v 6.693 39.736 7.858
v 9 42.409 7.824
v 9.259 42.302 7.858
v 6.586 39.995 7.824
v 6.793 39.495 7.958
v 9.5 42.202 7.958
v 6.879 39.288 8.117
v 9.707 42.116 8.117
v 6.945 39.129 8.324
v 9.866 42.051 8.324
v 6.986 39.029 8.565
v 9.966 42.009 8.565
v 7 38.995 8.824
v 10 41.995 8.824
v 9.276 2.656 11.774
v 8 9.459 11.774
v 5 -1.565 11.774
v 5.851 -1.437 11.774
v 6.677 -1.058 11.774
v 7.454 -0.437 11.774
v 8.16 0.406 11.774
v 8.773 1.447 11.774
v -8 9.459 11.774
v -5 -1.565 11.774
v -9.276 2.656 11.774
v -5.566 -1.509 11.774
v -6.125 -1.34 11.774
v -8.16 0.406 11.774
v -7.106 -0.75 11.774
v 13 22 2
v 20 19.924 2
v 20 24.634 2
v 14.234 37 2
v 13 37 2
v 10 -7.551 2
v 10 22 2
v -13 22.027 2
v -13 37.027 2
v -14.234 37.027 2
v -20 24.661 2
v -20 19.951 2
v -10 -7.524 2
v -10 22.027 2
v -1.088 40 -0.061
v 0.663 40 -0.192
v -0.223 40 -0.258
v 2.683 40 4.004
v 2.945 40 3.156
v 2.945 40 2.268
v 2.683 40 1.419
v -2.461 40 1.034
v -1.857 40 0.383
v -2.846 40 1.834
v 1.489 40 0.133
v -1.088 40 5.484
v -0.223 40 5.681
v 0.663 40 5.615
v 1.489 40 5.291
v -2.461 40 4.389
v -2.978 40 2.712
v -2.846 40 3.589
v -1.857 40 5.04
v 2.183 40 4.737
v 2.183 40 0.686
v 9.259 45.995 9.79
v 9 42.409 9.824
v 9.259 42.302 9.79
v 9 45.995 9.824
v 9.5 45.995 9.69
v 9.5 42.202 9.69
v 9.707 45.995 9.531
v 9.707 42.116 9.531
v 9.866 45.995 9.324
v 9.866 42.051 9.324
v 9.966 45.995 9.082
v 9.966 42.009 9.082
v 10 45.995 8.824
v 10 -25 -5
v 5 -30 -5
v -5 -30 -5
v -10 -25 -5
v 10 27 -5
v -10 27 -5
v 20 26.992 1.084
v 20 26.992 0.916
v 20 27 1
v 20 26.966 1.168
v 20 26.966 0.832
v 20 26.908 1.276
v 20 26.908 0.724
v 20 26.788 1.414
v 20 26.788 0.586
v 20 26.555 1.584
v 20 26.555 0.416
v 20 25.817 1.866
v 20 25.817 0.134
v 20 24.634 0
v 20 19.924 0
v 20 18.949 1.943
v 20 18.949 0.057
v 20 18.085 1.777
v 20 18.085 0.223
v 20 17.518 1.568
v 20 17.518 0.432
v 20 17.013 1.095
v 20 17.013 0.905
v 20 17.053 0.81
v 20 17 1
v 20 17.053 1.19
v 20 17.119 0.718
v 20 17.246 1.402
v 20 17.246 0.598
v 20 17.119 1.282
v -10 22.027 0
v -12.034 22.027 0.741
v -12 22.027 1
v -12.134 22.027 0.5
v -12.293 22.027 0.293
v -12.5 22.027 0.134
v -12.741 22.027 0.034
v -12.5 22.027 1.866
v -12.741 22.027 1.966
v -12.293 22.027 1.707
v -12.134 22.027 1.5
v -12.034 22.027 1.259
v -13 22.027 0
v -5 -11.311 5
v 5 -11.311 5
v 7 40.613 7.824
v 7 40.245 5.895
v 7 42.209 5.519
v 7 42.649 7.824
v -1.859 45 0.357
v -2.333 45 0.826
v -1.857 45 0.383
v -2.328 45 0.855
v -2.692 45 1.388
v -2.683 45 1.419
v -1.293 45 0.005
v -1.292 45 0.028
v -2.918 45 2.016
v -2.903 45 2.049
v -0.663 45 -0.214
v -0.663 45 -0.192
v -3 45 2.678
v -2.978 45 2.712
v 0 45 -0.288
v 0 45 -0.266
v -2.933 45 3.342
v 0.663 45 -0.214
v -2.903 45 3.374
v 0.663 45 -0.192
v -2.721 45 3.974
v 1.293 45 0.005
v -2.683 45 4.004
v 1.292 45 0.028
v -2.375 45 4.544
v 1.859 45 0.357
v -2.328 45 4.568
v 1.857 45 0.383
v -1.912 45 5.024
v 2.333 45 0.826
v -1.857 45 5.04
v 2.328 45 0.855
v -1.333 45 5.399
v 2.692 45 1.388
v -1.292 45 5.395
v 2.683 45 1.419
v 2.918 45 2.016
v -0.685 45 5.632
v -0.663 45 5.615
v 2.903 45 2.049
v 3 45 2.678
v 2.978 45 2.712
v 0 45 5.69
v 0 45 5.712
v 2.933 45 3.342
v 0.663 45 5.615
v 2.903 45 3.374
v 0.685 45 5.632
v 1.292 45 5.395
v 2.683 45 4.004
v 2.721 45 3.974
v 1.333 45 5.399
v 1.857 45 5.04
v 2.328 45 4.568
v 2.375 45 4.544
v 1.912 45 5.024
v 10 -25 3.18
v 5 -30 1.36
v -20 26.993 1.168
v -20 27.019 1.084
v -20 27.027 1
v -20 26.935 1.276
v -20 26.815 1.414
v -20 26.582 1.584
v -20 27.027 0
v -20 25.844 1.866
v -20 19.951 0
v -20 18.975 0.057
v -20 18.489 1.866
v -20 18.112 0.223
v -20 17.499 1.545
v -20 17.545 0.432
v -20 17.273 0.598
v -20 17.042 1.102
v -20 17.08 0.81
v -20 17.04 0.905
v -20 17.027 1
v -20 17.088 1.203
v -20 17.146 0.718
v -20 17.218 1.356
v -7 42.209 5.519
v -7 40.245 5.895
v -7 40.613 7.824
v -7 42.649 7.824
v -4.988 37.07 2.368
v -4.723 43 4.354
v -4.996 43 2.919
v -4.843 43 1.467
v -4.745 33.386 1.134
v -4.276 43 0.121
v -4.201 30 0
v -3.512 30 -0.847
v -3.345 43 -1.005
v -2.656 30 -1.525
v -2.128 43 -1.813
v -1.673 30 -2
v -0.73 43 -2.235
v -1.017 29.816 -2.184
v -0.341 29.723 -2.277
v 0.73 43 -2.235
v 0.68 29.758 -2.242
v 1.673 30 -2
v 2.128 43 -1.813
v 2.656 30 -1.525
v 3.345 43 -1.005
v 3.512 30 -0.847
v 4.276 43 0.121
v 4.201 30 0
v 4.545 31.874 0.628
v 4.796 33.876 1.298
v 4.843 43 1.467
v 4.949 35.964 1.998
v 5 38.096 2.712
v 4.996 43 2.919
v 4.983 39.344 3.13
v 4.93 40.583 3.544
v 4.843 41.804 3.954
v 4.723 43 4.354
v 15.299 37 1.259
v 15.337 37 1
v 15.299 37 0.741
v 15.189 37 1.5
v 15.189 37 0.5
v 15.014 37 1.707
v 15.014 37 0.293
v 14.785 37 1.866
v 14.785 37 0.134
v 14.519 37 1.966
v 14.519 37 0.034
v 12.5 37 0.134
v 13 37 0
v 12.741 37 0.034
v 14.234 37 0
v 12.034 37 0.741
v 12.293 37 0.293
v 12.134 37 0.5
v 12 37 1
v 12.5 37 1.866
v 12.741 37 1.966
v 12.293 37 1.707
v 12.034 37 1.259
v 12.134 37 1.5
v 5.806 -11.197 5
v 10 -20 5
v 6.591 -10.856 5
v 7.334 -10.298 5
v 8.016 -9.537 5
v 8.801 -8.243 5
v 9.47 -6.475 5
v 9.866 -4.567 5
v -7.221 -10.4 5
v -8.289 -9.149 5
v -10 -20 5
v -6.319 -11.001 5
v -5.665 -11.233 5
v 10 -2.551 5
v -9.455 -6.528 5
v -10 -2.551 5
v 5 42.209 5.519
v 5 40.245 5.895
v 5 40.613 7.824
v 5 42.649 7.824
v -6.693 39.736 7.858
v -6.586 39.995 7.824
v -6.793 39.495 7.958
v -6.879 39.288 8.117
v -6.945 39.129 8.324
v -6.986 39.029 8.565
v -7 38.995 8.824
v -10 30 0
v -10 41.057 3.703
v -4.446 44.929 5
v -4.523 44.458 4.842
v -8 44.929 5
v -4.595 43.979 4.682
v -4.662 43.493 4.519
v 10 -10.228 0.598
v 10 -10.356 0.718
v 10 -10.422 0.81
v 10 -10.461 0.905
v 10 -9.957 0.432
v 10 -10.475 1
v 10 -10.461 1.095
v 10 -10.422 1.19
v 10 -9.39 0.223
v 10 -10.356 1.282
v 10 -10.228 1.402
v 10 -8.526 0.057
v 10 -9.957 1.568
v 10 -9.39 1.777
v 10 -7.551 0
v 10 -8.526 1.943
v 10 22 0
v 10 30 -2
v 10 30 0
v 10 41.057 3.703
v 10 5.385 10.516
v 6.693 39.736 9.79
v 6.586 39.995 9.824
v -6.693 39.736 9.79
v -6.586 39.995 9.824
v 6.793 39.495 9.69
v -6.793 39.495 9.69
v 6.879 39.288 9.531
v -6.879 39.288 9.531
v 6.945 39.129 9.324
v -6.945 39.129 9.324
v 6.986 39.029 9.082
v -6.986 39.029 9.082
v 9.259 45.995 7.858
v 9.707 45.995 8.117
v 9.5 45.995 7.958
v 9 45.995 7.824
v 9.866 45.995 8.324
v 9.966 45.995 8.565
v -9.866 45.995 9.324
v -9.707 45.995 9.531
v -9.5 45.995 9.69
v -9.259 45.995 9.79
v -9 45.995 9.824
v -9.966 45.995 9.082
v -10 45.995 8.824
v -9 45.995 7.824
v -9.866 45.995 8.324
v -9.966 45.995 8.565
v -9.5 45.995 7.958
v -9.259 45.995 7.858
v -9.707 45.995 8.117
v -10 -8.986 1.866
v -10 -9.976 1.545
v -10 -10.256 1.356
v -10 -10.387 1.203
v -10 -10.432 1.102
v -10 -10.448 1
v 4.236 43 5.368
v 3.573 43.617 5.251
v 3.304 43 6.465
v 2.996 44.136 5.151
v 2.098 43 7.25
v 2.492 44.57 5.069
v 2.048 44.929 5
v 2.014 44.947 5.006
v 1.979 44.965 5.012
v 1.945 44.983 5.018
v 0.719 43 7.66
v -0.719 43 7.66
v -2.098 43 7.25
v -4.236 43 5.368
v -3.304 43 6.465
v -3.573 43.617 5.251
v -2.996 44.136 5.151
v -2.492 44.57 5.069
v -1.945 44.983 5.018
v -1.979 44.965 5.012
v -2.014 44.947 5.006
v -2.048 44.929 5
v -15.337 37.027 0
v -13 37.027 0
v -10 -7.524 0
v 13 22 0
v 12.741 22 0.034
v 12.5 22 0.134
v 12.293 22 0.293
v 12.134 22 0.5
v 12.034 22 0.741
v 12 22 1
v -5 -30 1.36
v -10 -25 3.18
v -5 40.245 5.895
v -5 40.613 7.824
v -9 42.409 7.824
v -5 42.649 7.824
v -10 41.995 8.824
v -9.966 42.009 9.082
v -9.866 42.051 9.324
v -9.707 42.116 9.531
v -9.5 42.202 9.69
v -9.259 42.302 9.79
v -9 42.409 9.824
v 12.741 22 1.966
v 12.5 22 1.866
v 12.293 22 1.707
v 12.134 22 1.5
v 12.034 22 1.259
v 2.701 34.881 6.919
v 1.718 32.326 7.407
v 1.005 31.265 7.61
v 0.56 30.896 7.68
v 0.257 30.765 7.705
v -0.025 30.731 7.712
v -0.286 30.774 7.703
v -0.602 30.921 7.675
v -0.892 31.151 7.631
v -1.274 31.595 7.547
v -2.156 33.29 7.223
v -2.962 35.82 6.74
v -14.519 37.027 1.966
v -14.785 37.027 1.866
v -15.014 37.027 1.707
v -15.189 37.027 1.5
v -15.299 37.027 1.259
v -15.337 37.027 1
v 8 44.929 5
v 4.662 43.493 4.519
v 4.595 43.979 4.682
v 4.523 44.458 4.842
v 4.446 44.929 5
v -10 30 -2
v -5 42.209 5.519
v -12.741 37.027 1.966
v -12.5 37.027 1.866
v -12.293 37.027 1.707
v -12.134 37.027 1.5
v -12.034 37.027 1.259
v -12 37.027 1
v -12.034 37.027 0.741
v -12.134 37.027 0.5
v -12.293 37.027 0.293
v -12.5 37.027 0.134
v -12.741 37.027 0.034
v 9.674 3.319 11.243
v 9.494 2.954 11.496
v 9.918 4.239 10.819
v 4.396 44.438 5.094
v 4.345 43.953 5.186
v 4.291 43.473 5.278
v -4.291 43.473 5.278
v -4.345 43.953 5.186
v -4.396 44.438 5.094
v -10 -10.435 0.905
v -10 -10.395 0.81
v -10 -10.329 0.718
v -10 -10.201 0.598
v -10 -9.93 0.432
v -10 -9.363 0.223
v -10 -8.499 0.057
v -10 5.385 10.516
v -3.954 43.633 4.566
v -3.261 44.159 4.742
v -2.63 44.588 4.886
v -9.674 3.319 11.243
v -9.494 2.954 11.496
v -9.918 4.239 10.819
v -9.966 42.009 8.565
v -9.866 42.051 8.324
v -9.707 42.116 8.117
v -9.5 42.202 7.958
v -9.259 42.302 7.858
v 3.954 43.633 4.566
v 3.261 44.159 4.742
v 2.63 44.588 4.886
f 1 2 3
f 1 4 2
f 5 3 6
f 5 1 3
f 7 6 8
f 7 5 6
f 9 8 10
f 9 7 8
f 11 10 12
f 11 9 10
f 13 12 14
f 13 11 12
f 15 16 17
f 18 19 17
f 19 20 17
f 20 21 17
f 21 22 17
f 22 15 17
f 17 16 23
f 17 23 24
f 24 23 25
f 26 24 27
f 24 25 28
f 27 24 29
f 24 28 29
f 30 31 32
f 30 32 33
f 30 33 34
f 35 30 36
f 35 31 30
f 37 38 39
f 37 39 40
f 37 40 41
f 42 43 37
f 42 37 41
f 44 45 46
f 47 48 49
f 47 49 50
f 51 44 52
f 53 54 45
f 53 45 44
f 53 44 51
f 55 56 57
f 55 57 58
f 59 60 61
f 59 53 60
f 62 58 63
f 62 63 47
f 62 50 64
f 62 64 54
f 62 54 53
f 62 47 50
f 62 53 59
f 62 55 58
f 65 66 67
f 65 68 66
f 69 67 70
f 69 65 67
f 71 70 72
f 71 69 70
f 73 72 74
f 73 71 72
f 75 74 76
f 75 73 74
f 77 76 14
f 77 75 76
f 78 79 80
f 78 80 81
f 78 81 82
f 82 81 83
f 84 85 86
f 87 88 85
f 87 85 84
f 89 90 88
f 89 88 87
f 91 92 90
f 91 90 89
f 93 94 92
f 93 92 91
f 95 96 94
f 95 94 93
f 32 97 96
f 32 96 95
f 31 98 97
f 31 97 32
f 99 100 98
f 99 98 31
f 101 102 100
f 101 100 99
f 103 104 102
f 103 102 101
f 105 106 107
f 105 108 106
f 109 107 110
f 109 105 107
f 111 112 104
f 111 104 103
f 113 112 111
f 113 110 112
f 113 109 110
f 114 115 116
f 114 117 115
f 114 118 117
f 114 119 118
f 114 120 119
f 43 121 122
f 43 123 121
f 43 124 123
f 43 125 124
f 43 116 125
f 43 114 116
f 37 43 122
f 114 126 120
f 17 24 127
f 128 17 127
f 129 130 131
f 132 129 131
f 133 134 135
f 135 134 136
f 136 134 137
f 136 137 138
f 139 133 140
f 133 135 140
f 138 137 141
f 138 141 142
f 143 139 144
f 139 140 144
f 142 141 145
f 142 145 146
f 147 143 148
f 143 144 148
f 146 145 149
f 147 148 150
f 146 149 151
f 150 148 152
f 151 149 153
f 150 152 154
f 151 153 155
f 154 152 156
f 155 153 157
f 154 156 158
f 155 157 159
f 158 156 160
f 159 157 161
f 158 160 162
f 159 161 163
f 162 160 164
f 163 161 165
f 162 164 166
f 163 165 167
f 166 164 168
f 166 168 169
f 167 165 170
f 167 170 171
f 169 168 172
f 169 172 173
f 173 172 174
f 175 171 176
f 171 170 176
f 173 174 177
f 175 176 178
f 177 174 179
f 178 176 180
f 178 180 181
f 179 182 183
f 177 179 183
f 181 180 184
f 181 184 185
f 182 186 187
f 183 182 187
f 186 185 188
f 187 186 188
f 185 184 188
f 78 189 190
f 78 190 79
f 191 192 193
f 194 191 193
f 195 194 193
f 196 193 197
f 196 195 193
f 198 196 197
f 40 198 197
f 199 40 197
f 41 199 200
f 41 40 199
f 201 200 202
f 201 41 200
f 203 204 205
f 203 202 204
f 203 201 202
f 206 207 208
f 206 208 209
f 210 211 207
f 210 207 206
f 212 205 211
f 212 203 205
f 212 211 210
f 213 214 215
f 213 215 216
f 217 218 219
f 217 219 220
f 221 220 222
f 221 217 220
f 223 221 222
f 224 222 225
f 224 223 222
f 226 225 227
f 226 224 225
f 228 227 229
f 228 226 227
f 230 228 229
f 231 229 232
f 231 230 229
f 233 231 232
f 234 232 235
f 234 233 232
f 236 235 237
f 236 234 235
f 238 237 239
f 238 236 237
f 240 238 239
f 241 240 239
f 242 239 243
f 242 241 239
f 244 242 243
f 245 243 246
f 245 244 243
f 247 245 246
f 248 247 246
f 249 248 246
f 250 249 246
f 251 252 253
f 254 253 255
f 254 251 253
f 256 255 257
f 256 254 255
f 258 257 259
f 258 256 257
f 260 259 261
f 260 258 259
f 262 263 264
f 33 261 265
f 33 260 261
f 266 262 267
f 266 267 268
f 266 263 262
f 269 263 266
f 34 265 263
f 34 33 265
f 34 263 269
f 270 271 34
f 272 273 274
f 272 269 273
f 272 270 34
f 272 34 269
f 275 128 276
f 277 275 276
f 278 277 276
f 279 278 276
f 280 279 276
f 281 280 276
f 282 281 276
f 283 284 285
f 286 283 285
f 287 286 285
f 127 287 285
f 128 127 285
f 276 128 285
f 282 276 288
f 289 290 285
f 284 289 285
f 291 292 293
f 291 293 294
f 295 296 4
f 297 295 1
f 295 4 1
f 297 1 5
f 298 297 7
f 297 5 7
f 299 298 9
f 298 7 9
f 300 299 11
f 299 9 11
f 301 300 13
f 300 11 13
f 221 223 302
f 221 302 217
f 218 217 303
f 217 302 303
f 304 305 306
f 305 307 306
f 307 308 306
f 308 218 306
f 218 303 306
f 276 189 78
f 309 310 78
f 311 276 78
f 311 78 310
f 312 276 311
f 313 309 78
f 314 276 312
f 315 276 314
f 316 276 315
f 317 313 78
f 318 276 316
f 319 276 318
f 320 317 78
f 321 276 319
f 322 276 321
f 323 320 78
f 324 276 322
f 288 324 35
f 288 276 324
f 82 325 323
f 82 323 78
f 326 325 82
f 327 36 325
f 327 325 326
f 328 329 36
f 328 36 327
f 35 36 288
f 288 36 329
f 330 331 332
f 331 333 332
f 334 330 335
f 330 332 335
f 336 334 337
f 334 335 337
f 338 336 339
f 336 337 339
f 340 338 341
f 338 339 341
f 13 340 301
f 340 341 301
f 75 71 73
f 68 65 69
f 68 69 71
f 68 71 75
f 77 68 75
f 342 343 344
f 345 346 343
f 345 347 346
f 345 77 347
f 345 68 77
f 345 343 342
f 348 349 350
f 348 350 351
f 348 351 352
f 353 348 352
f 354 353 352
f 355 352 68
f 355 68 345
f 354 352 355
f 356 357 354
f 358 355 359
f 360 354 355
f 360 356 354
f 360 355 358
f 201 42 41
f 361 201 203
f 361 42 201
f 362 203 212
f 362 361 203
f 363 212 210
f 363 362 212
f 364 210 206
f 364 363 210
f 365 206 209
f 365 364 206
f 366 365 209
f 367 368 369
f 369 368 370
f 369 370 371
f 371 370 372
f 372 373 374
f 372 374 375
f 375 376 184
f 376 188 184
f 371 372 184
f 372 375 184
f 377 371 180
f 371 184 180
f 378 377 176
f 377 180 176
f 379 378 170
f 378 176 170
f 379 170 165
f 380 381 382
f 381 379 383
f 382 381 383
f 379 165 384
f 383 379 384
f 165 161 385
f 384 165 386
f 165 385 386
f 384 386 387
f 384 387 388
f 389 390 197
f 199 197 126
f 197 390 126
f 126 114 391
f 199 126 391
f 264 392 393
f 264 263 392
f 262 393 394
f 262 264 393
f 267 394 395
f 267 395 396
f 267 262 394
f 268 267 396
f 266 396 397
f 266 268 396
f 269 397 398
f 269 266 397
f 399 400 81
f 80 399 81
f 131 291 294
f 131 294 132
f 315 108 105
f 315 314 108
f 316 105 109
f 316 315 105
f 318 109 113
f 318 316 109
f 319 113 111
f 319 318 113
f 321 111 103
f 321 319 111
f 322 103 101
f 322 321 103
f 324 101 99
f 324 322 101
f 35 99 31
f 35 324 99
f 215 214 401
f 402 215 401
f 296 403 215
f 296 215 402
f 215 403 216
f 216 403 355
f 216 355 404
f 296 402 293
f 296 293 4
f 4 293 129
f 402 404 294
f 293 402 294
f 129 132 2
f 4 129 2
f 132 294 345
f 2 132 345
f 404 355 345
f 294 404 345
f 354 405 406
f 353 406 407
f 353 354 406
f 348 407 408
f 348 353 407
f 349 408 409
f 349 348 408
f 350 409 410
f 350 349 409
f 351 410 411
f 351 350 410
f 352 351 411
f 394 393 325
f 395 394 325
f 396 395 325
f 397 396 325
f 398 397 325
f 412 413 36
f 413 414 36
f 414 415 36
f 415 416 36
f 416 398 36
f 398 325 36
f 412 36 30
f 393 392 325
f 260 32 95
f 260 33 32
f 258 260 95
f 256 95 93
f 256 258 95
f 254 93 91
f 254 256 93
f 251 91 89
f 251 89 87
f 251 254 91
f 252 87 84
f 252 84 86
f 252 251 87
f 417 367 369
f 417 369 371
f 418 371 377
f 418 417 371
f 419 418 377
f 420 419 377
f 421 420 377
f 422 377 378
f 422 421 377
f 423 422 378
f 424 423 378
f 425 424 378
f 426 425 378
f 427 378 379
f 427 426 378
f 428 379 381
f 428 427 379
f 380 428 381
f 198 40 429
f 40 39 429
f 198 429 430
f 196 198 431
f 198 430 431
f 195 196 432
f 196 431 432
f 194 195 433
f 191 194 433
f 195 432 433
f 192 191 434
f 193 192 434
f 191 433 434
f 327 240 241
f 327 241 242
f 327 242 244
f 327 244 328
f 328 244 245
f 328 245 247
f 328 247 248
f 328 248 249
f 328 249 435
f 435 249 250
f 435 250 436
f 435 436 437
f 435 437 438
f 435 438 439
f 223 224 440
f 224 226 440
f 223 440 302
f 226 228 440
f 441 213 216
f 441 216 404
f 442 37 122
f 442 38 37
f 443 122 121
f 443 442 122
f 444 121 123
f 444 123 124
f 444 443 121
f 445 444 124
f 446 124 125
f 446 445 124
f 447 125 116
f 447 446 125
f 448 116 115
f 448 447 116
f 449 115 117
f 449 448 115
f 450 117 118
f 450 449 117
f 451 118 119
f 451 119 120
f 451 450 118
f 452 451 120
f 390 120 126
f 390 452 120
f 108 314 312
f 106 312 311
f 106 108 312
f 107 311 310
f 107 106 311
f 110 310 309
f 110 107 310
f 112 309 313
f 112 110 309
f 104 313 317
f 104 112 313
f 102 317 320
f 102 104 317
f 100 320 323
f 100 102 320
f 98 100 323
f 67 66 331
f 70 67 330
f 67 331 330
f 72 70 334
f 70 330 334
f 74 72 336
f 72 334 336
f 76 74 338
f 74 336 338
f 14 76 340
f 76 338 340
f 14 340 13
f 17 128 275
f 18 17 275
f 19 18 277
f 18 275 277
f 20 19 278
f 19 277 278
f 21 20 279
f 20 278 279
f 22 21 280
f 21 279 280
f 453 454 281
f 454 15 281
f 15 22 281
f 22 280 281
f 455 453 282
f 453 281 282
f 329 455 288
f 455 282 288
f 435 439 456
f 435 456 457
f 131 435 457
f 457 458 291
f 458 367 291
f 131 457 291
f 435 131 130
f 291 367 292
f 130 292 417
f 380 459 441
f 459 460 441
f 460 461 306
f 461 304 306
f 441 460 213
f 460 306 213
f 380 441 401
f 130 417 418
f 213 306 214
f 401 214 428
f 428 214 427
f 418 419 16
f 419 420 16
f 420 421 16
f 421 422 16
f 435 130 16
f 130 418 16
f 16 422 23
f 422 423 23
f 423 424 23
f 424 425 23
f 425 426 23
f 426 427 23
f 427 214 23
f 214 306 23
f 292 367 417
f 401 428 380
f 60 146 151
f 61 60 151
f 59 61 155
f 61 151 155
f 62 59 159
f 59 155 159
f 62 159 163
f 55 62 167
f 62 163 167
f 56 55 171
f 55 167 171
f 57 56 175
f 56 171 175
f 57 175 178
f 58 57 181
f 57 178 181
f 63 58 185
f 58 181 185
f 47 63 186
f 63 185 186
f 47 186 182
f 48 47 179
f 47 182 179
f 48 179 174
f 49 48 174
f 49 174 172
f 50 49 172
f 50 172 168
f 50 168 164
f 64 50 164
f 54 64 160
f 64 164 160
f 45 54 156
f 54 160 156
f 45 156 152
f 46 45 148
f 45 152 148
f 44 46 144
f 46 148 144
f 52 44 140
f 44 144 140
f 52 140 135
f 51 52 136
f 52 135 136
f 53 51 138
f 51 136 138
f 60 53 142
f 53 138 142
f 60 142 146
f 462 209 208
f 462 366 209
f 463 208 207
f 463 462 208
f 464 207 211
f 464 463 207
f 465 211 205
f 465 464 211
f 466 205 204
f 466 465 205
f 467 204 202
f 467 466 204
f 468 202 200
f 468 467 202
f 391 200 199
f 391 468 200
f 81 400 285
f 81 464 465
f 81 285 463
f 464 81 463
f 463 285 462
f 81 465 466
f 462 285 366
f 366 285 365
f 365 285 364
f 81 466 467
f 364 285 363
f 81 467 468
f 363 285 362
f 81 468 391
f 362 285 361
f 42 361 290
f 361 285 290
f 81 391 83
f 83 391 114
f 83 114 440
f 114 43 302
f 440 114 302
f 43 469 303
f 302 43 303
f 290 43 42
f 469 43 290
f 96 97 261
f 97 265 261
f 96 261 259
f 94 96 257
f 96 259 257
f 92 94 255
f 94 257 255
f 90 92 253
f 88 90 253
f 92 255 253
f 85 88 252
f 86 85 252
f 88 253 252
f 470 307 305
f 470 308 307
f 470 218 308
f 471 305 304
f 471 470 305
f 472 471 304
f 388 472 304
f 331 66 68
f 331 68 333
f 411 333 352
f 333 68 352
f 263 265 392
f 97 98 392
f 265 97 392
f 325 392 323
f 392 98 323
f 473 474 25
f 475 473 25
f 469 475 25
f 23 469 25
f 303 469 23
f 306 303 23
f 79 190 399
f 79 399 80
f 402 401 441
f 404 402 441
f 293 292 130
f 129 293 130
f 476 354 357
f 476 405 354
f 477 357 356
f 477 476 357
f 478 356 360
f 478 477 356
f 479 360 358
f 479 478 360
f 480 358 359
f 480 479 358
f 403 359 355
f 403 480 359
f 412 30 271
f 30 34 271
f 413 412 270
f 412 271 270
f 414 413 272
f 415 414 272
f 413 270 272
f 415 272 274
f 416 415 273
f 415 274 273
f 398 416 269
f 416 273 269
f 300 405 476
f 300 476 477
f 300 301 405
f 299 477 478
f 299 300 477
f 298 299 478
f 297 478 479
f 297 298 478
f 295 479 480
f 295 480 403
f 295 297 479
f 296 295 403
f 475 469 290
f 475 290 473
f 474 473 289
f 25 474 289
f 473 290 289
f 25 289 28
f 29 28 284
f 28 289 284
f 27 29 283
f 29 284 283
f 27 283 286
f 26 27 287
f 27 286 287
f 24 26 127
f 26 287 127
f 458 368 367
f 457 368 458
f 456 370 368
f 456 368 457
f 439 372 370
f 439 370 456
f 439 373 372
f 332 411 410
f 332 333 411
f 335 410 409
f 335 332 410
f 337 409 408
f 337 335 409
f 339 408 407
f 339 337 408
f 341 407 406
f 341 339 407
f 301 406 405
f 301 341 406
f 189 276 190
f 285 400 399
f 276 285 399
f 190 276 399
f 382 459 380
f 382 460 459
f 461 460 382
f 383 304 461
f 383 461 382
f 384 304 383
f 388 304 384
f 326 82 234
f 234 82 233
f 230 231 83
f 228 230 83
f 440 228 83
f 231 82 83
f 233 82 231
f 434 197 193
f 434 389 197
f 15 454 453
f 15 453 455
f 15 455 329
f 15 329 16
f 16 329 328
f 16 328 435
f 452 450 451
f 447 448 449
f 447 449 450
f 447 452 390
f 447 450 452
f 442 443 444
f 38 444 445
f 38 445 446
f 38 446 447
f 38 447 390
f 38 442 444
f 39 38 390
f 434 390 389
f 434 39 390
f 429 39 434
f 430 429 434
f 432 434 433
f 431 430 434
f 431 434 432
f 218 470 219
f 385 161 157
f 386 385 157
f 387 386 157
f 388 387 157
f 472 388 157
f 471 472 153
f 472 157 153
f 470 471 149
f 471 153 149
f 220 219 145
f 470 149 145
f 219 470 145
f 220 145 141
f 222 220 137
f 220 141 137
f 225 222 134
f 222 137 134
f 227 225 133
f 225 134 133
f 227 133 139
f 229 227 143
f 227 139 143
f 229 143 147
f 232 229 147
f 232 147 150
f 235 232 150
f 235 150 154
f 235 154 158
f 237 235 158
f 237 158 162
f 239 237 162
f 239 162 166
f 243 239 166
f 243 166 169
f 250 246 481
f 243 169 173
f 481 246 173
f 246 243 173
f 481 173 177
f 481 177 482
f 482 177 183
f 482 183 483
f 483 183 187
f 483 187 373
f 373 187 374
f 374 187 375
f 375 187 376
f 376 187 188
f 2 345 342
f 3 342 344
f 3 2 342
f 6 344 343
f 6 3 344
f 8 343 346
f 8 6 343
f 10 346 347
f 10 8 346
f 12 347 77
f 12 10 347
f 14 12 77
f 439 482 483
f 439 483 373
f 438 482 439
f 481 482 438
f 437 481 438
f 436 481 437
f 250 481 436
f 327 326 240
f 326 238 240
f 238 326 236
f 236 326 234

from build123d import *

# Parameters (mm, degrees)
F1_DEPTH     = 10
F2_DEPTH     = 10
F3_R         = 5
F4_T1_DEPTH  = 71.883894651
F5_T1_DEPTH  = 56.6843134125
F6_SIZE      = 3
F7_SIZE      = 5
F10_DEPTH    = 10
F9_W         = 35
F9_H         = 2
F11_DEPTH    = 10
F12_T4_DEPTH = 157.651683953
F13_T4_DEPTH = 157.651683953
F14_W        = 8
F14_H        = 2
F15_W        = 8
F15_H        = 2
F16_DEPTH    = 15
F17_SIZE2    = 4.6630765815
F17_SIZE     = 10
F18_SIZE2    = 4.6630765815
F18_SIZE     = 10
F19_R        = 0.99999
F20_R        = 5
F21_DEPTH    = 45
F22_R        = 2.9781353661
F23_DEPTH    = 5
F25_W        = 2
F25_H        = 2
F26_DEPTH    = 4
F28_DEPTH    = 15
F29_DEPTH    = 5
F30_W        = 5
F30_H        = 2
F31_DEPTH    = 2
F32_SIZE     = 3
F33_R        = 0.99999


# Not quite as in the source:
# - a fillet or chamfer that OpenCascade refuses, or shapes differently, is made with other operations: its cross-section is extruded or revolved along the edge and cut away or added
# - a fillet or chamfer is up to 0.001 mm smaller than in the source, because OpenCascade refuses the exact size


with BuildPart() as f1:
    # F0 (on Right) → F1 (new body)
    with BuildSketch(Plane.YZ):
        Polygon((30, 5), (30, 0), (44.9290536344, 5), (9.4593074173, 11.7742568254), (-1.5650746645, 11.7742568254), (-11.31126564, 5), align=None)
        Polygon((30, 0), (0, 0), (-30, 0), (-30, -5), (30, -5), align=None)
        Polygon((-30, 0), (0, 0), (30, 0), (30, 5), (-11.31126564, 5), (-30, 5), align=None)
    extrude(amount=-F1_DEPTH)

    # F2 (add): a face of the model
    f2_faces = [f1.faces().sort_by_distance(p)[0] for p in [
        (0, 4.6213303299, 2.1526362718),
    ]]
    extrude(f2_faces, amount=F2_DEPTH)

    # F3
    f3_edges = [f1.edges().sort_by_distance(p)[0] for p in [
        (-10, -6.43817, 8.387128),
        (10, -6.43817, 8.387128),
    ]]
    fillet(f3_edges, radius=F3_R)

    # F4: chamfer of 10 x 3.6397023427 on 1 edges, made by hand

    # F4_s2 → F4_t1 (cut)
    with BuildSketch(Plane.YZ.offset(-35.9419473255)):
        Polygon((-20, 5), (-30, 1.3602976573), (-30, 5), align=None)
    extrude(amount=F4_T1_DEPTH, mode=Mode.SUBTRACT)

    # F5: chamfer of 2 on 2 edges, made by hand

    # F5_s2 → F5_t1 (cut)
    with BuildSketch(Plane(origin=(0, 47.4786197454, -9.0677943367), x_dir=(1, 0, 0), z_dir=(0, -0.9822462418, 0.1875961634))):
        Polygon((-10, 11.3397492965), (-8, 13.3397492965), (-10, 13.3397492965), align=None)
        Polygon((10, 11.3397492965), (8, 13.3397492965), (10, 13.3397492965), align=None)
    extrude(amount=F5_T1_DEPTH, mode=Mode.SUBTRACT)

    # F6
    f6_edges = [f1.edges().sort_by_distance(p)[0] for p in [
        (0, 30, -5),
    ]]
    chamfer(f6_edges, length=F6_SIZE)

    # F7
    f7_edges = [f1.edges().sort_by_distance(p)[0] for p in [
        (-10, -30, -1.819851),
        (10, -30, -1.819851),
    ]]
    chamfer(f7_edges, length=F7_SIZE)

    # F8 (on face) → F10 (join)
    with BuildSketch(Plane.YZ.offset(10)):
        Polygon((-13, 0), (0, 0), (22, 0), (22, 2), (-13, 2), align=None)
    extrude(amount=F10_DEPTH)

    # F9 (on face) → F11 (join)
    with BuildSketch(Plane(origin=(-10, 0, 0), x_dir=(0, -1, 0), z_dir=(-1, 0, 0))):
        with Locations((-4.5269672573, 1)):
            Rectangle(F9_W, F9_H)
    extrude(amount=F11_DEPTH)

    # F12: chamfer of 30 x 10.919107028 on 1 edges, made by hand


with BuildPart() as f12_tool2:
    # F12_s3 → F12_t4 (new body)
    with BuildSketch(Plane.XY.offset(-77.8258419765)):
        Polygon((-9.080892972, -12.9730327427), (-20, 17.0269672573), (-20, -12.9730327427), align=None)
    extrude(amount=F12_T4_DEPTH)

    split(bisect_by=Plane.YZ.offset(-10), keep=Keep.BOTTOM)


with BuildPart() as f1_1:
    add(f1.part)

    # F12_t1: cut F12_tool2
    add(f12_tool2.part, mode=Mode.SUBTRACT)

    # F13: chamfer of 30 x 10.919107028 on 1 edges, made by hand


with BuildPart() as f13_tool2:
    # F13_s3 → F13_t4 (new body)
    with BuildSketch(Plane.XY.offset(79.8258419765)):
        Polygon((9.080892972, -13), (20, 17), (20, -13), align=None)
    extrude(amount=-F13_T4_DEPTH)

    split(bisect_by=Plane.YZ.offset(10), keep=Keep.TOP)


with BuildPart() as f1_2:
    add(f1_1.part)

    # F13_t1: cut F13_tool2
    add(f13_tool2.part, mode=Mode.SUBTRACT)

    # F14 (on face) + F15 (on face) → F16 (join)
    with BuildSketch(Plane(origin=(0, 22, 0), x_dir=(-1, 0, 0), z_dir=(0, 1, 0))):
        with Locations((-16, 1)):
            Rectangle(F14_W, F14_H)
    with BuildSketch(Plane(origin=(0, 22.0269672573, 0), x_dir=(-1, 0, 0), z_dir=(0, 1, 0))):
        with Locations((16, 1)):
            Rectangle(F15_W, F15_H)
    extrude(amount=F16_DEPTH)

    # F17
    f17_edges = [f1_2.edges().sort_by_distance(p)[0] for p in [
        (20, 37, 1),
    ]]
    f17_side = f1_2.faces().sort_by_distance((20, 27, 1))[0]
    chamfer(f17_edges, length=F17_SIZE, length2=F17_SIZE2, reference=f17_side)

    # F18
    f18_edges = [f1_2.edges().sort_by_distance(p)[0] for p in [
        (-20, 37.026967, 1),
    ]]
    f18_side = f1_2.faces().sort_by_distance((-20, 27.026967, 1))[0]
    chamfer(f18_edges, length=F18_SIZE, length2=F18_SIZE2, reference=f18_side)

    # F19 (radius 1 in the source; OpenCascade refuses exactly that, so slightly less here)
    f19_edges = [f1_2.edges().sort_by_distance(p)[0] for p in [
        (15, 3.262613, 2),
        (15, 3.262613, 0),
        (17.668462, 32, 0),
        (17.668462, 32, 2),
        (12, 29.5, 2),
        (12, 29.5, 0),
        (-15, 3.28958, 2),
        (-15, 3.28958, 0),
        (-17.668462, 32.026967, 2),
        (-12, 29.526967, 2),
        (-12, 29.526967, 0),
    ]]
    fillet(f19_edges, radius=F19_R)

    # F20 (on Front) → F21 (join)
    with BuildSketch(Plane.XZ):
        with Locations((0, 2.7116553392)):
            Circle(F20_R)
    extrude(amount=-F21_DEPTH)

    # F22 (on face) → F23 (cut)
    with BuildSketch(Plane(origin=(0, 45, 0), x_dir=(-1, 0, 0), z_dir=(0, 1, 0))):
        with Locations((0, 2.7116553392)):
            Circle(F22_R)
    extrude(amount=-F23_DEPTH, mode=Mode.SUBTRACT)

    # F24: chamfer of 2 on 1 edges, made by hand


with BuildPart() as f24_tool2:
    # F24_s3 → F24_t4 (revolve)
    with BuildSketch(Plane.XY.offset(2.7116553392)):
        Polygon((5, 43), (3, 45), (5, 45), align=None)
    revolve(axis=Axis((0, 45, 2.7116553392), (0, -1, 0)))

    split(bisect_by=Plane(origin=(0, 3.0256985599, -9.0341632165), x_dir=(1, 0, 0), z_dir=(0, 0.3175793108, -0.9482317129)), keep=Keep.TOP)


with BuildPart() as f1_3:
    add(f1_2.part)

    # F24_t1: cut F24_tool2
    add(f24_tool2.part, mode=Mode.SUBTRACT)


with BuildPart() as f24_tool7:
    # F24_s8 → F24_t9 (revolve)
    with BuildSketch(Plane.XY.offset(2.7116553392)):
        Polygon((5, 43), (3, 45), (5, 45), align=None)
    revolve(axis=Axis((0, 45, 2.7116553392), (0, -1, 0)))

    split(bisect_by=Plane(origin=(0, 2.5024857889, 13.1029186126), x_dir=(1, 0, 0), z_dir=(0, 0.1875961634, 0.9822462418)), keep=Keep.TOP)


with BuildPart() as f1_4:
    add(f1_3.part)

    # F24_t6: cut F24_tool7
    add(f24_tool7.part, mode=Mode.SUBTRACT)

    # F25 (on face) → F26 (join)
    with BuildSketch(Plane(origin=(0, 2.5024857889, 13.1029186126), x_dir=(1, 0, 0), z_dir=(0, 0.1875961634, 0.9822462418))):
        with Locations((-6, 39.4243540466)):
            Rectangle(F25_W, F25_H)
        with Locations((6, 39.4243540466)):
            Rectangle(F25_W, F25_H)
    extrude(amount=F26_DEPTH)

    # F27 (on face) → F28 (join)
    with BuildSketch(Plane(origin=(5, 0, 0), x_dir=(0, -1, 0), z_dir=(-1, 0, 0))):
        Polygon((-42.9595402808, 9.4484498521), (-40.9950477973, 9.8236421789), (-45.9950477973, 9.8236421789), (-45.9950477973, 7.8236421789), (-42.6492233025, 7.8236421789), align=None)
        Polygon((-40.9950477973, 7.8236421789), (-40.9950477973, 9.8236421789), (-42.9595402808, 9.4484498521), (-42.6492233025, 7.8236421789), align=None)
    extrude(amount=F28_DEPTH)

    # F27 (on face) → F29 (join)
    with BuildSketch(Plane(origin=(5, 0, 0), x_dir=(0, -1, 0), z_dir=(-1, 0, 0))):
        Polygon((-42.9595402808, 9.4484498521), (-40.9950477973, 9.8236421789), (-45.9950477973, 9.8236421789), (-45.9950477973, 7.8236421789), (-42.6492233025, 7.8236421789), align=None)
        Polygon((-40.9950477973, 7.8236421789), (-40.9950477973, 9.8236421789), (-42.9595402808, 9.4484498521), (-42.6492233025, 7.8236421789), align=None)
    extrude(amount=-F29_DEPTH)

    # F30 (on face) → F31 (join)
    with BuildSketch(Plane.XZ.offset(-40.9950477973)):
        with Locations((-7.5, 8.8236421789)):
            Rectangle(F30_W, F30_H)
        Polygon((-5, 7.8236421789), (0, 7.8236421789), (5, 7.8236421789), (5, 9.8236421789), (0, 9.8236421789), (-5, 9.8236421789), align=None)
        with Locations((7.5, 8.8236421789)):
            Rectangle(F30_W, F30_H)
    extrude(amount=F31_DEPTH)

    # F32
    f32_edges = [f1_4.edges().sort_by_distance(p)[0] for p in [
        (-10, 38.995048, 8.823642),
        (10, 38.995048, 8.823642),
    ]]
    chamfer(f32_edges, length=F32_SIZE)

    # F33 (radius 1 in the source; OpenCascade refuses exactly that, so slightly less here)
    f33_edges = [f1_4.edges().sort_by_distance(p)[0] for p in [
        (0, 38.995048, 7.823642),
        (0, 38.995048, 9.823642),
        (-8.5, 40.495048, 9.823642),
        (-8.5, 40.495048, 7.823642),
        (8.5, 40.495048, 9.823642),
        (8.5, 40.495048, 7.823642),
        (10, 43.995048, 7.823642),
        (10, 43.995048, 9.823642),
        (-10, 43.995048, 9.823642),
        (-10, 43.995048, 7.823642),
    ]]
    fillet(f33_edges, radius=F33_R)


solid = f1_4.part
